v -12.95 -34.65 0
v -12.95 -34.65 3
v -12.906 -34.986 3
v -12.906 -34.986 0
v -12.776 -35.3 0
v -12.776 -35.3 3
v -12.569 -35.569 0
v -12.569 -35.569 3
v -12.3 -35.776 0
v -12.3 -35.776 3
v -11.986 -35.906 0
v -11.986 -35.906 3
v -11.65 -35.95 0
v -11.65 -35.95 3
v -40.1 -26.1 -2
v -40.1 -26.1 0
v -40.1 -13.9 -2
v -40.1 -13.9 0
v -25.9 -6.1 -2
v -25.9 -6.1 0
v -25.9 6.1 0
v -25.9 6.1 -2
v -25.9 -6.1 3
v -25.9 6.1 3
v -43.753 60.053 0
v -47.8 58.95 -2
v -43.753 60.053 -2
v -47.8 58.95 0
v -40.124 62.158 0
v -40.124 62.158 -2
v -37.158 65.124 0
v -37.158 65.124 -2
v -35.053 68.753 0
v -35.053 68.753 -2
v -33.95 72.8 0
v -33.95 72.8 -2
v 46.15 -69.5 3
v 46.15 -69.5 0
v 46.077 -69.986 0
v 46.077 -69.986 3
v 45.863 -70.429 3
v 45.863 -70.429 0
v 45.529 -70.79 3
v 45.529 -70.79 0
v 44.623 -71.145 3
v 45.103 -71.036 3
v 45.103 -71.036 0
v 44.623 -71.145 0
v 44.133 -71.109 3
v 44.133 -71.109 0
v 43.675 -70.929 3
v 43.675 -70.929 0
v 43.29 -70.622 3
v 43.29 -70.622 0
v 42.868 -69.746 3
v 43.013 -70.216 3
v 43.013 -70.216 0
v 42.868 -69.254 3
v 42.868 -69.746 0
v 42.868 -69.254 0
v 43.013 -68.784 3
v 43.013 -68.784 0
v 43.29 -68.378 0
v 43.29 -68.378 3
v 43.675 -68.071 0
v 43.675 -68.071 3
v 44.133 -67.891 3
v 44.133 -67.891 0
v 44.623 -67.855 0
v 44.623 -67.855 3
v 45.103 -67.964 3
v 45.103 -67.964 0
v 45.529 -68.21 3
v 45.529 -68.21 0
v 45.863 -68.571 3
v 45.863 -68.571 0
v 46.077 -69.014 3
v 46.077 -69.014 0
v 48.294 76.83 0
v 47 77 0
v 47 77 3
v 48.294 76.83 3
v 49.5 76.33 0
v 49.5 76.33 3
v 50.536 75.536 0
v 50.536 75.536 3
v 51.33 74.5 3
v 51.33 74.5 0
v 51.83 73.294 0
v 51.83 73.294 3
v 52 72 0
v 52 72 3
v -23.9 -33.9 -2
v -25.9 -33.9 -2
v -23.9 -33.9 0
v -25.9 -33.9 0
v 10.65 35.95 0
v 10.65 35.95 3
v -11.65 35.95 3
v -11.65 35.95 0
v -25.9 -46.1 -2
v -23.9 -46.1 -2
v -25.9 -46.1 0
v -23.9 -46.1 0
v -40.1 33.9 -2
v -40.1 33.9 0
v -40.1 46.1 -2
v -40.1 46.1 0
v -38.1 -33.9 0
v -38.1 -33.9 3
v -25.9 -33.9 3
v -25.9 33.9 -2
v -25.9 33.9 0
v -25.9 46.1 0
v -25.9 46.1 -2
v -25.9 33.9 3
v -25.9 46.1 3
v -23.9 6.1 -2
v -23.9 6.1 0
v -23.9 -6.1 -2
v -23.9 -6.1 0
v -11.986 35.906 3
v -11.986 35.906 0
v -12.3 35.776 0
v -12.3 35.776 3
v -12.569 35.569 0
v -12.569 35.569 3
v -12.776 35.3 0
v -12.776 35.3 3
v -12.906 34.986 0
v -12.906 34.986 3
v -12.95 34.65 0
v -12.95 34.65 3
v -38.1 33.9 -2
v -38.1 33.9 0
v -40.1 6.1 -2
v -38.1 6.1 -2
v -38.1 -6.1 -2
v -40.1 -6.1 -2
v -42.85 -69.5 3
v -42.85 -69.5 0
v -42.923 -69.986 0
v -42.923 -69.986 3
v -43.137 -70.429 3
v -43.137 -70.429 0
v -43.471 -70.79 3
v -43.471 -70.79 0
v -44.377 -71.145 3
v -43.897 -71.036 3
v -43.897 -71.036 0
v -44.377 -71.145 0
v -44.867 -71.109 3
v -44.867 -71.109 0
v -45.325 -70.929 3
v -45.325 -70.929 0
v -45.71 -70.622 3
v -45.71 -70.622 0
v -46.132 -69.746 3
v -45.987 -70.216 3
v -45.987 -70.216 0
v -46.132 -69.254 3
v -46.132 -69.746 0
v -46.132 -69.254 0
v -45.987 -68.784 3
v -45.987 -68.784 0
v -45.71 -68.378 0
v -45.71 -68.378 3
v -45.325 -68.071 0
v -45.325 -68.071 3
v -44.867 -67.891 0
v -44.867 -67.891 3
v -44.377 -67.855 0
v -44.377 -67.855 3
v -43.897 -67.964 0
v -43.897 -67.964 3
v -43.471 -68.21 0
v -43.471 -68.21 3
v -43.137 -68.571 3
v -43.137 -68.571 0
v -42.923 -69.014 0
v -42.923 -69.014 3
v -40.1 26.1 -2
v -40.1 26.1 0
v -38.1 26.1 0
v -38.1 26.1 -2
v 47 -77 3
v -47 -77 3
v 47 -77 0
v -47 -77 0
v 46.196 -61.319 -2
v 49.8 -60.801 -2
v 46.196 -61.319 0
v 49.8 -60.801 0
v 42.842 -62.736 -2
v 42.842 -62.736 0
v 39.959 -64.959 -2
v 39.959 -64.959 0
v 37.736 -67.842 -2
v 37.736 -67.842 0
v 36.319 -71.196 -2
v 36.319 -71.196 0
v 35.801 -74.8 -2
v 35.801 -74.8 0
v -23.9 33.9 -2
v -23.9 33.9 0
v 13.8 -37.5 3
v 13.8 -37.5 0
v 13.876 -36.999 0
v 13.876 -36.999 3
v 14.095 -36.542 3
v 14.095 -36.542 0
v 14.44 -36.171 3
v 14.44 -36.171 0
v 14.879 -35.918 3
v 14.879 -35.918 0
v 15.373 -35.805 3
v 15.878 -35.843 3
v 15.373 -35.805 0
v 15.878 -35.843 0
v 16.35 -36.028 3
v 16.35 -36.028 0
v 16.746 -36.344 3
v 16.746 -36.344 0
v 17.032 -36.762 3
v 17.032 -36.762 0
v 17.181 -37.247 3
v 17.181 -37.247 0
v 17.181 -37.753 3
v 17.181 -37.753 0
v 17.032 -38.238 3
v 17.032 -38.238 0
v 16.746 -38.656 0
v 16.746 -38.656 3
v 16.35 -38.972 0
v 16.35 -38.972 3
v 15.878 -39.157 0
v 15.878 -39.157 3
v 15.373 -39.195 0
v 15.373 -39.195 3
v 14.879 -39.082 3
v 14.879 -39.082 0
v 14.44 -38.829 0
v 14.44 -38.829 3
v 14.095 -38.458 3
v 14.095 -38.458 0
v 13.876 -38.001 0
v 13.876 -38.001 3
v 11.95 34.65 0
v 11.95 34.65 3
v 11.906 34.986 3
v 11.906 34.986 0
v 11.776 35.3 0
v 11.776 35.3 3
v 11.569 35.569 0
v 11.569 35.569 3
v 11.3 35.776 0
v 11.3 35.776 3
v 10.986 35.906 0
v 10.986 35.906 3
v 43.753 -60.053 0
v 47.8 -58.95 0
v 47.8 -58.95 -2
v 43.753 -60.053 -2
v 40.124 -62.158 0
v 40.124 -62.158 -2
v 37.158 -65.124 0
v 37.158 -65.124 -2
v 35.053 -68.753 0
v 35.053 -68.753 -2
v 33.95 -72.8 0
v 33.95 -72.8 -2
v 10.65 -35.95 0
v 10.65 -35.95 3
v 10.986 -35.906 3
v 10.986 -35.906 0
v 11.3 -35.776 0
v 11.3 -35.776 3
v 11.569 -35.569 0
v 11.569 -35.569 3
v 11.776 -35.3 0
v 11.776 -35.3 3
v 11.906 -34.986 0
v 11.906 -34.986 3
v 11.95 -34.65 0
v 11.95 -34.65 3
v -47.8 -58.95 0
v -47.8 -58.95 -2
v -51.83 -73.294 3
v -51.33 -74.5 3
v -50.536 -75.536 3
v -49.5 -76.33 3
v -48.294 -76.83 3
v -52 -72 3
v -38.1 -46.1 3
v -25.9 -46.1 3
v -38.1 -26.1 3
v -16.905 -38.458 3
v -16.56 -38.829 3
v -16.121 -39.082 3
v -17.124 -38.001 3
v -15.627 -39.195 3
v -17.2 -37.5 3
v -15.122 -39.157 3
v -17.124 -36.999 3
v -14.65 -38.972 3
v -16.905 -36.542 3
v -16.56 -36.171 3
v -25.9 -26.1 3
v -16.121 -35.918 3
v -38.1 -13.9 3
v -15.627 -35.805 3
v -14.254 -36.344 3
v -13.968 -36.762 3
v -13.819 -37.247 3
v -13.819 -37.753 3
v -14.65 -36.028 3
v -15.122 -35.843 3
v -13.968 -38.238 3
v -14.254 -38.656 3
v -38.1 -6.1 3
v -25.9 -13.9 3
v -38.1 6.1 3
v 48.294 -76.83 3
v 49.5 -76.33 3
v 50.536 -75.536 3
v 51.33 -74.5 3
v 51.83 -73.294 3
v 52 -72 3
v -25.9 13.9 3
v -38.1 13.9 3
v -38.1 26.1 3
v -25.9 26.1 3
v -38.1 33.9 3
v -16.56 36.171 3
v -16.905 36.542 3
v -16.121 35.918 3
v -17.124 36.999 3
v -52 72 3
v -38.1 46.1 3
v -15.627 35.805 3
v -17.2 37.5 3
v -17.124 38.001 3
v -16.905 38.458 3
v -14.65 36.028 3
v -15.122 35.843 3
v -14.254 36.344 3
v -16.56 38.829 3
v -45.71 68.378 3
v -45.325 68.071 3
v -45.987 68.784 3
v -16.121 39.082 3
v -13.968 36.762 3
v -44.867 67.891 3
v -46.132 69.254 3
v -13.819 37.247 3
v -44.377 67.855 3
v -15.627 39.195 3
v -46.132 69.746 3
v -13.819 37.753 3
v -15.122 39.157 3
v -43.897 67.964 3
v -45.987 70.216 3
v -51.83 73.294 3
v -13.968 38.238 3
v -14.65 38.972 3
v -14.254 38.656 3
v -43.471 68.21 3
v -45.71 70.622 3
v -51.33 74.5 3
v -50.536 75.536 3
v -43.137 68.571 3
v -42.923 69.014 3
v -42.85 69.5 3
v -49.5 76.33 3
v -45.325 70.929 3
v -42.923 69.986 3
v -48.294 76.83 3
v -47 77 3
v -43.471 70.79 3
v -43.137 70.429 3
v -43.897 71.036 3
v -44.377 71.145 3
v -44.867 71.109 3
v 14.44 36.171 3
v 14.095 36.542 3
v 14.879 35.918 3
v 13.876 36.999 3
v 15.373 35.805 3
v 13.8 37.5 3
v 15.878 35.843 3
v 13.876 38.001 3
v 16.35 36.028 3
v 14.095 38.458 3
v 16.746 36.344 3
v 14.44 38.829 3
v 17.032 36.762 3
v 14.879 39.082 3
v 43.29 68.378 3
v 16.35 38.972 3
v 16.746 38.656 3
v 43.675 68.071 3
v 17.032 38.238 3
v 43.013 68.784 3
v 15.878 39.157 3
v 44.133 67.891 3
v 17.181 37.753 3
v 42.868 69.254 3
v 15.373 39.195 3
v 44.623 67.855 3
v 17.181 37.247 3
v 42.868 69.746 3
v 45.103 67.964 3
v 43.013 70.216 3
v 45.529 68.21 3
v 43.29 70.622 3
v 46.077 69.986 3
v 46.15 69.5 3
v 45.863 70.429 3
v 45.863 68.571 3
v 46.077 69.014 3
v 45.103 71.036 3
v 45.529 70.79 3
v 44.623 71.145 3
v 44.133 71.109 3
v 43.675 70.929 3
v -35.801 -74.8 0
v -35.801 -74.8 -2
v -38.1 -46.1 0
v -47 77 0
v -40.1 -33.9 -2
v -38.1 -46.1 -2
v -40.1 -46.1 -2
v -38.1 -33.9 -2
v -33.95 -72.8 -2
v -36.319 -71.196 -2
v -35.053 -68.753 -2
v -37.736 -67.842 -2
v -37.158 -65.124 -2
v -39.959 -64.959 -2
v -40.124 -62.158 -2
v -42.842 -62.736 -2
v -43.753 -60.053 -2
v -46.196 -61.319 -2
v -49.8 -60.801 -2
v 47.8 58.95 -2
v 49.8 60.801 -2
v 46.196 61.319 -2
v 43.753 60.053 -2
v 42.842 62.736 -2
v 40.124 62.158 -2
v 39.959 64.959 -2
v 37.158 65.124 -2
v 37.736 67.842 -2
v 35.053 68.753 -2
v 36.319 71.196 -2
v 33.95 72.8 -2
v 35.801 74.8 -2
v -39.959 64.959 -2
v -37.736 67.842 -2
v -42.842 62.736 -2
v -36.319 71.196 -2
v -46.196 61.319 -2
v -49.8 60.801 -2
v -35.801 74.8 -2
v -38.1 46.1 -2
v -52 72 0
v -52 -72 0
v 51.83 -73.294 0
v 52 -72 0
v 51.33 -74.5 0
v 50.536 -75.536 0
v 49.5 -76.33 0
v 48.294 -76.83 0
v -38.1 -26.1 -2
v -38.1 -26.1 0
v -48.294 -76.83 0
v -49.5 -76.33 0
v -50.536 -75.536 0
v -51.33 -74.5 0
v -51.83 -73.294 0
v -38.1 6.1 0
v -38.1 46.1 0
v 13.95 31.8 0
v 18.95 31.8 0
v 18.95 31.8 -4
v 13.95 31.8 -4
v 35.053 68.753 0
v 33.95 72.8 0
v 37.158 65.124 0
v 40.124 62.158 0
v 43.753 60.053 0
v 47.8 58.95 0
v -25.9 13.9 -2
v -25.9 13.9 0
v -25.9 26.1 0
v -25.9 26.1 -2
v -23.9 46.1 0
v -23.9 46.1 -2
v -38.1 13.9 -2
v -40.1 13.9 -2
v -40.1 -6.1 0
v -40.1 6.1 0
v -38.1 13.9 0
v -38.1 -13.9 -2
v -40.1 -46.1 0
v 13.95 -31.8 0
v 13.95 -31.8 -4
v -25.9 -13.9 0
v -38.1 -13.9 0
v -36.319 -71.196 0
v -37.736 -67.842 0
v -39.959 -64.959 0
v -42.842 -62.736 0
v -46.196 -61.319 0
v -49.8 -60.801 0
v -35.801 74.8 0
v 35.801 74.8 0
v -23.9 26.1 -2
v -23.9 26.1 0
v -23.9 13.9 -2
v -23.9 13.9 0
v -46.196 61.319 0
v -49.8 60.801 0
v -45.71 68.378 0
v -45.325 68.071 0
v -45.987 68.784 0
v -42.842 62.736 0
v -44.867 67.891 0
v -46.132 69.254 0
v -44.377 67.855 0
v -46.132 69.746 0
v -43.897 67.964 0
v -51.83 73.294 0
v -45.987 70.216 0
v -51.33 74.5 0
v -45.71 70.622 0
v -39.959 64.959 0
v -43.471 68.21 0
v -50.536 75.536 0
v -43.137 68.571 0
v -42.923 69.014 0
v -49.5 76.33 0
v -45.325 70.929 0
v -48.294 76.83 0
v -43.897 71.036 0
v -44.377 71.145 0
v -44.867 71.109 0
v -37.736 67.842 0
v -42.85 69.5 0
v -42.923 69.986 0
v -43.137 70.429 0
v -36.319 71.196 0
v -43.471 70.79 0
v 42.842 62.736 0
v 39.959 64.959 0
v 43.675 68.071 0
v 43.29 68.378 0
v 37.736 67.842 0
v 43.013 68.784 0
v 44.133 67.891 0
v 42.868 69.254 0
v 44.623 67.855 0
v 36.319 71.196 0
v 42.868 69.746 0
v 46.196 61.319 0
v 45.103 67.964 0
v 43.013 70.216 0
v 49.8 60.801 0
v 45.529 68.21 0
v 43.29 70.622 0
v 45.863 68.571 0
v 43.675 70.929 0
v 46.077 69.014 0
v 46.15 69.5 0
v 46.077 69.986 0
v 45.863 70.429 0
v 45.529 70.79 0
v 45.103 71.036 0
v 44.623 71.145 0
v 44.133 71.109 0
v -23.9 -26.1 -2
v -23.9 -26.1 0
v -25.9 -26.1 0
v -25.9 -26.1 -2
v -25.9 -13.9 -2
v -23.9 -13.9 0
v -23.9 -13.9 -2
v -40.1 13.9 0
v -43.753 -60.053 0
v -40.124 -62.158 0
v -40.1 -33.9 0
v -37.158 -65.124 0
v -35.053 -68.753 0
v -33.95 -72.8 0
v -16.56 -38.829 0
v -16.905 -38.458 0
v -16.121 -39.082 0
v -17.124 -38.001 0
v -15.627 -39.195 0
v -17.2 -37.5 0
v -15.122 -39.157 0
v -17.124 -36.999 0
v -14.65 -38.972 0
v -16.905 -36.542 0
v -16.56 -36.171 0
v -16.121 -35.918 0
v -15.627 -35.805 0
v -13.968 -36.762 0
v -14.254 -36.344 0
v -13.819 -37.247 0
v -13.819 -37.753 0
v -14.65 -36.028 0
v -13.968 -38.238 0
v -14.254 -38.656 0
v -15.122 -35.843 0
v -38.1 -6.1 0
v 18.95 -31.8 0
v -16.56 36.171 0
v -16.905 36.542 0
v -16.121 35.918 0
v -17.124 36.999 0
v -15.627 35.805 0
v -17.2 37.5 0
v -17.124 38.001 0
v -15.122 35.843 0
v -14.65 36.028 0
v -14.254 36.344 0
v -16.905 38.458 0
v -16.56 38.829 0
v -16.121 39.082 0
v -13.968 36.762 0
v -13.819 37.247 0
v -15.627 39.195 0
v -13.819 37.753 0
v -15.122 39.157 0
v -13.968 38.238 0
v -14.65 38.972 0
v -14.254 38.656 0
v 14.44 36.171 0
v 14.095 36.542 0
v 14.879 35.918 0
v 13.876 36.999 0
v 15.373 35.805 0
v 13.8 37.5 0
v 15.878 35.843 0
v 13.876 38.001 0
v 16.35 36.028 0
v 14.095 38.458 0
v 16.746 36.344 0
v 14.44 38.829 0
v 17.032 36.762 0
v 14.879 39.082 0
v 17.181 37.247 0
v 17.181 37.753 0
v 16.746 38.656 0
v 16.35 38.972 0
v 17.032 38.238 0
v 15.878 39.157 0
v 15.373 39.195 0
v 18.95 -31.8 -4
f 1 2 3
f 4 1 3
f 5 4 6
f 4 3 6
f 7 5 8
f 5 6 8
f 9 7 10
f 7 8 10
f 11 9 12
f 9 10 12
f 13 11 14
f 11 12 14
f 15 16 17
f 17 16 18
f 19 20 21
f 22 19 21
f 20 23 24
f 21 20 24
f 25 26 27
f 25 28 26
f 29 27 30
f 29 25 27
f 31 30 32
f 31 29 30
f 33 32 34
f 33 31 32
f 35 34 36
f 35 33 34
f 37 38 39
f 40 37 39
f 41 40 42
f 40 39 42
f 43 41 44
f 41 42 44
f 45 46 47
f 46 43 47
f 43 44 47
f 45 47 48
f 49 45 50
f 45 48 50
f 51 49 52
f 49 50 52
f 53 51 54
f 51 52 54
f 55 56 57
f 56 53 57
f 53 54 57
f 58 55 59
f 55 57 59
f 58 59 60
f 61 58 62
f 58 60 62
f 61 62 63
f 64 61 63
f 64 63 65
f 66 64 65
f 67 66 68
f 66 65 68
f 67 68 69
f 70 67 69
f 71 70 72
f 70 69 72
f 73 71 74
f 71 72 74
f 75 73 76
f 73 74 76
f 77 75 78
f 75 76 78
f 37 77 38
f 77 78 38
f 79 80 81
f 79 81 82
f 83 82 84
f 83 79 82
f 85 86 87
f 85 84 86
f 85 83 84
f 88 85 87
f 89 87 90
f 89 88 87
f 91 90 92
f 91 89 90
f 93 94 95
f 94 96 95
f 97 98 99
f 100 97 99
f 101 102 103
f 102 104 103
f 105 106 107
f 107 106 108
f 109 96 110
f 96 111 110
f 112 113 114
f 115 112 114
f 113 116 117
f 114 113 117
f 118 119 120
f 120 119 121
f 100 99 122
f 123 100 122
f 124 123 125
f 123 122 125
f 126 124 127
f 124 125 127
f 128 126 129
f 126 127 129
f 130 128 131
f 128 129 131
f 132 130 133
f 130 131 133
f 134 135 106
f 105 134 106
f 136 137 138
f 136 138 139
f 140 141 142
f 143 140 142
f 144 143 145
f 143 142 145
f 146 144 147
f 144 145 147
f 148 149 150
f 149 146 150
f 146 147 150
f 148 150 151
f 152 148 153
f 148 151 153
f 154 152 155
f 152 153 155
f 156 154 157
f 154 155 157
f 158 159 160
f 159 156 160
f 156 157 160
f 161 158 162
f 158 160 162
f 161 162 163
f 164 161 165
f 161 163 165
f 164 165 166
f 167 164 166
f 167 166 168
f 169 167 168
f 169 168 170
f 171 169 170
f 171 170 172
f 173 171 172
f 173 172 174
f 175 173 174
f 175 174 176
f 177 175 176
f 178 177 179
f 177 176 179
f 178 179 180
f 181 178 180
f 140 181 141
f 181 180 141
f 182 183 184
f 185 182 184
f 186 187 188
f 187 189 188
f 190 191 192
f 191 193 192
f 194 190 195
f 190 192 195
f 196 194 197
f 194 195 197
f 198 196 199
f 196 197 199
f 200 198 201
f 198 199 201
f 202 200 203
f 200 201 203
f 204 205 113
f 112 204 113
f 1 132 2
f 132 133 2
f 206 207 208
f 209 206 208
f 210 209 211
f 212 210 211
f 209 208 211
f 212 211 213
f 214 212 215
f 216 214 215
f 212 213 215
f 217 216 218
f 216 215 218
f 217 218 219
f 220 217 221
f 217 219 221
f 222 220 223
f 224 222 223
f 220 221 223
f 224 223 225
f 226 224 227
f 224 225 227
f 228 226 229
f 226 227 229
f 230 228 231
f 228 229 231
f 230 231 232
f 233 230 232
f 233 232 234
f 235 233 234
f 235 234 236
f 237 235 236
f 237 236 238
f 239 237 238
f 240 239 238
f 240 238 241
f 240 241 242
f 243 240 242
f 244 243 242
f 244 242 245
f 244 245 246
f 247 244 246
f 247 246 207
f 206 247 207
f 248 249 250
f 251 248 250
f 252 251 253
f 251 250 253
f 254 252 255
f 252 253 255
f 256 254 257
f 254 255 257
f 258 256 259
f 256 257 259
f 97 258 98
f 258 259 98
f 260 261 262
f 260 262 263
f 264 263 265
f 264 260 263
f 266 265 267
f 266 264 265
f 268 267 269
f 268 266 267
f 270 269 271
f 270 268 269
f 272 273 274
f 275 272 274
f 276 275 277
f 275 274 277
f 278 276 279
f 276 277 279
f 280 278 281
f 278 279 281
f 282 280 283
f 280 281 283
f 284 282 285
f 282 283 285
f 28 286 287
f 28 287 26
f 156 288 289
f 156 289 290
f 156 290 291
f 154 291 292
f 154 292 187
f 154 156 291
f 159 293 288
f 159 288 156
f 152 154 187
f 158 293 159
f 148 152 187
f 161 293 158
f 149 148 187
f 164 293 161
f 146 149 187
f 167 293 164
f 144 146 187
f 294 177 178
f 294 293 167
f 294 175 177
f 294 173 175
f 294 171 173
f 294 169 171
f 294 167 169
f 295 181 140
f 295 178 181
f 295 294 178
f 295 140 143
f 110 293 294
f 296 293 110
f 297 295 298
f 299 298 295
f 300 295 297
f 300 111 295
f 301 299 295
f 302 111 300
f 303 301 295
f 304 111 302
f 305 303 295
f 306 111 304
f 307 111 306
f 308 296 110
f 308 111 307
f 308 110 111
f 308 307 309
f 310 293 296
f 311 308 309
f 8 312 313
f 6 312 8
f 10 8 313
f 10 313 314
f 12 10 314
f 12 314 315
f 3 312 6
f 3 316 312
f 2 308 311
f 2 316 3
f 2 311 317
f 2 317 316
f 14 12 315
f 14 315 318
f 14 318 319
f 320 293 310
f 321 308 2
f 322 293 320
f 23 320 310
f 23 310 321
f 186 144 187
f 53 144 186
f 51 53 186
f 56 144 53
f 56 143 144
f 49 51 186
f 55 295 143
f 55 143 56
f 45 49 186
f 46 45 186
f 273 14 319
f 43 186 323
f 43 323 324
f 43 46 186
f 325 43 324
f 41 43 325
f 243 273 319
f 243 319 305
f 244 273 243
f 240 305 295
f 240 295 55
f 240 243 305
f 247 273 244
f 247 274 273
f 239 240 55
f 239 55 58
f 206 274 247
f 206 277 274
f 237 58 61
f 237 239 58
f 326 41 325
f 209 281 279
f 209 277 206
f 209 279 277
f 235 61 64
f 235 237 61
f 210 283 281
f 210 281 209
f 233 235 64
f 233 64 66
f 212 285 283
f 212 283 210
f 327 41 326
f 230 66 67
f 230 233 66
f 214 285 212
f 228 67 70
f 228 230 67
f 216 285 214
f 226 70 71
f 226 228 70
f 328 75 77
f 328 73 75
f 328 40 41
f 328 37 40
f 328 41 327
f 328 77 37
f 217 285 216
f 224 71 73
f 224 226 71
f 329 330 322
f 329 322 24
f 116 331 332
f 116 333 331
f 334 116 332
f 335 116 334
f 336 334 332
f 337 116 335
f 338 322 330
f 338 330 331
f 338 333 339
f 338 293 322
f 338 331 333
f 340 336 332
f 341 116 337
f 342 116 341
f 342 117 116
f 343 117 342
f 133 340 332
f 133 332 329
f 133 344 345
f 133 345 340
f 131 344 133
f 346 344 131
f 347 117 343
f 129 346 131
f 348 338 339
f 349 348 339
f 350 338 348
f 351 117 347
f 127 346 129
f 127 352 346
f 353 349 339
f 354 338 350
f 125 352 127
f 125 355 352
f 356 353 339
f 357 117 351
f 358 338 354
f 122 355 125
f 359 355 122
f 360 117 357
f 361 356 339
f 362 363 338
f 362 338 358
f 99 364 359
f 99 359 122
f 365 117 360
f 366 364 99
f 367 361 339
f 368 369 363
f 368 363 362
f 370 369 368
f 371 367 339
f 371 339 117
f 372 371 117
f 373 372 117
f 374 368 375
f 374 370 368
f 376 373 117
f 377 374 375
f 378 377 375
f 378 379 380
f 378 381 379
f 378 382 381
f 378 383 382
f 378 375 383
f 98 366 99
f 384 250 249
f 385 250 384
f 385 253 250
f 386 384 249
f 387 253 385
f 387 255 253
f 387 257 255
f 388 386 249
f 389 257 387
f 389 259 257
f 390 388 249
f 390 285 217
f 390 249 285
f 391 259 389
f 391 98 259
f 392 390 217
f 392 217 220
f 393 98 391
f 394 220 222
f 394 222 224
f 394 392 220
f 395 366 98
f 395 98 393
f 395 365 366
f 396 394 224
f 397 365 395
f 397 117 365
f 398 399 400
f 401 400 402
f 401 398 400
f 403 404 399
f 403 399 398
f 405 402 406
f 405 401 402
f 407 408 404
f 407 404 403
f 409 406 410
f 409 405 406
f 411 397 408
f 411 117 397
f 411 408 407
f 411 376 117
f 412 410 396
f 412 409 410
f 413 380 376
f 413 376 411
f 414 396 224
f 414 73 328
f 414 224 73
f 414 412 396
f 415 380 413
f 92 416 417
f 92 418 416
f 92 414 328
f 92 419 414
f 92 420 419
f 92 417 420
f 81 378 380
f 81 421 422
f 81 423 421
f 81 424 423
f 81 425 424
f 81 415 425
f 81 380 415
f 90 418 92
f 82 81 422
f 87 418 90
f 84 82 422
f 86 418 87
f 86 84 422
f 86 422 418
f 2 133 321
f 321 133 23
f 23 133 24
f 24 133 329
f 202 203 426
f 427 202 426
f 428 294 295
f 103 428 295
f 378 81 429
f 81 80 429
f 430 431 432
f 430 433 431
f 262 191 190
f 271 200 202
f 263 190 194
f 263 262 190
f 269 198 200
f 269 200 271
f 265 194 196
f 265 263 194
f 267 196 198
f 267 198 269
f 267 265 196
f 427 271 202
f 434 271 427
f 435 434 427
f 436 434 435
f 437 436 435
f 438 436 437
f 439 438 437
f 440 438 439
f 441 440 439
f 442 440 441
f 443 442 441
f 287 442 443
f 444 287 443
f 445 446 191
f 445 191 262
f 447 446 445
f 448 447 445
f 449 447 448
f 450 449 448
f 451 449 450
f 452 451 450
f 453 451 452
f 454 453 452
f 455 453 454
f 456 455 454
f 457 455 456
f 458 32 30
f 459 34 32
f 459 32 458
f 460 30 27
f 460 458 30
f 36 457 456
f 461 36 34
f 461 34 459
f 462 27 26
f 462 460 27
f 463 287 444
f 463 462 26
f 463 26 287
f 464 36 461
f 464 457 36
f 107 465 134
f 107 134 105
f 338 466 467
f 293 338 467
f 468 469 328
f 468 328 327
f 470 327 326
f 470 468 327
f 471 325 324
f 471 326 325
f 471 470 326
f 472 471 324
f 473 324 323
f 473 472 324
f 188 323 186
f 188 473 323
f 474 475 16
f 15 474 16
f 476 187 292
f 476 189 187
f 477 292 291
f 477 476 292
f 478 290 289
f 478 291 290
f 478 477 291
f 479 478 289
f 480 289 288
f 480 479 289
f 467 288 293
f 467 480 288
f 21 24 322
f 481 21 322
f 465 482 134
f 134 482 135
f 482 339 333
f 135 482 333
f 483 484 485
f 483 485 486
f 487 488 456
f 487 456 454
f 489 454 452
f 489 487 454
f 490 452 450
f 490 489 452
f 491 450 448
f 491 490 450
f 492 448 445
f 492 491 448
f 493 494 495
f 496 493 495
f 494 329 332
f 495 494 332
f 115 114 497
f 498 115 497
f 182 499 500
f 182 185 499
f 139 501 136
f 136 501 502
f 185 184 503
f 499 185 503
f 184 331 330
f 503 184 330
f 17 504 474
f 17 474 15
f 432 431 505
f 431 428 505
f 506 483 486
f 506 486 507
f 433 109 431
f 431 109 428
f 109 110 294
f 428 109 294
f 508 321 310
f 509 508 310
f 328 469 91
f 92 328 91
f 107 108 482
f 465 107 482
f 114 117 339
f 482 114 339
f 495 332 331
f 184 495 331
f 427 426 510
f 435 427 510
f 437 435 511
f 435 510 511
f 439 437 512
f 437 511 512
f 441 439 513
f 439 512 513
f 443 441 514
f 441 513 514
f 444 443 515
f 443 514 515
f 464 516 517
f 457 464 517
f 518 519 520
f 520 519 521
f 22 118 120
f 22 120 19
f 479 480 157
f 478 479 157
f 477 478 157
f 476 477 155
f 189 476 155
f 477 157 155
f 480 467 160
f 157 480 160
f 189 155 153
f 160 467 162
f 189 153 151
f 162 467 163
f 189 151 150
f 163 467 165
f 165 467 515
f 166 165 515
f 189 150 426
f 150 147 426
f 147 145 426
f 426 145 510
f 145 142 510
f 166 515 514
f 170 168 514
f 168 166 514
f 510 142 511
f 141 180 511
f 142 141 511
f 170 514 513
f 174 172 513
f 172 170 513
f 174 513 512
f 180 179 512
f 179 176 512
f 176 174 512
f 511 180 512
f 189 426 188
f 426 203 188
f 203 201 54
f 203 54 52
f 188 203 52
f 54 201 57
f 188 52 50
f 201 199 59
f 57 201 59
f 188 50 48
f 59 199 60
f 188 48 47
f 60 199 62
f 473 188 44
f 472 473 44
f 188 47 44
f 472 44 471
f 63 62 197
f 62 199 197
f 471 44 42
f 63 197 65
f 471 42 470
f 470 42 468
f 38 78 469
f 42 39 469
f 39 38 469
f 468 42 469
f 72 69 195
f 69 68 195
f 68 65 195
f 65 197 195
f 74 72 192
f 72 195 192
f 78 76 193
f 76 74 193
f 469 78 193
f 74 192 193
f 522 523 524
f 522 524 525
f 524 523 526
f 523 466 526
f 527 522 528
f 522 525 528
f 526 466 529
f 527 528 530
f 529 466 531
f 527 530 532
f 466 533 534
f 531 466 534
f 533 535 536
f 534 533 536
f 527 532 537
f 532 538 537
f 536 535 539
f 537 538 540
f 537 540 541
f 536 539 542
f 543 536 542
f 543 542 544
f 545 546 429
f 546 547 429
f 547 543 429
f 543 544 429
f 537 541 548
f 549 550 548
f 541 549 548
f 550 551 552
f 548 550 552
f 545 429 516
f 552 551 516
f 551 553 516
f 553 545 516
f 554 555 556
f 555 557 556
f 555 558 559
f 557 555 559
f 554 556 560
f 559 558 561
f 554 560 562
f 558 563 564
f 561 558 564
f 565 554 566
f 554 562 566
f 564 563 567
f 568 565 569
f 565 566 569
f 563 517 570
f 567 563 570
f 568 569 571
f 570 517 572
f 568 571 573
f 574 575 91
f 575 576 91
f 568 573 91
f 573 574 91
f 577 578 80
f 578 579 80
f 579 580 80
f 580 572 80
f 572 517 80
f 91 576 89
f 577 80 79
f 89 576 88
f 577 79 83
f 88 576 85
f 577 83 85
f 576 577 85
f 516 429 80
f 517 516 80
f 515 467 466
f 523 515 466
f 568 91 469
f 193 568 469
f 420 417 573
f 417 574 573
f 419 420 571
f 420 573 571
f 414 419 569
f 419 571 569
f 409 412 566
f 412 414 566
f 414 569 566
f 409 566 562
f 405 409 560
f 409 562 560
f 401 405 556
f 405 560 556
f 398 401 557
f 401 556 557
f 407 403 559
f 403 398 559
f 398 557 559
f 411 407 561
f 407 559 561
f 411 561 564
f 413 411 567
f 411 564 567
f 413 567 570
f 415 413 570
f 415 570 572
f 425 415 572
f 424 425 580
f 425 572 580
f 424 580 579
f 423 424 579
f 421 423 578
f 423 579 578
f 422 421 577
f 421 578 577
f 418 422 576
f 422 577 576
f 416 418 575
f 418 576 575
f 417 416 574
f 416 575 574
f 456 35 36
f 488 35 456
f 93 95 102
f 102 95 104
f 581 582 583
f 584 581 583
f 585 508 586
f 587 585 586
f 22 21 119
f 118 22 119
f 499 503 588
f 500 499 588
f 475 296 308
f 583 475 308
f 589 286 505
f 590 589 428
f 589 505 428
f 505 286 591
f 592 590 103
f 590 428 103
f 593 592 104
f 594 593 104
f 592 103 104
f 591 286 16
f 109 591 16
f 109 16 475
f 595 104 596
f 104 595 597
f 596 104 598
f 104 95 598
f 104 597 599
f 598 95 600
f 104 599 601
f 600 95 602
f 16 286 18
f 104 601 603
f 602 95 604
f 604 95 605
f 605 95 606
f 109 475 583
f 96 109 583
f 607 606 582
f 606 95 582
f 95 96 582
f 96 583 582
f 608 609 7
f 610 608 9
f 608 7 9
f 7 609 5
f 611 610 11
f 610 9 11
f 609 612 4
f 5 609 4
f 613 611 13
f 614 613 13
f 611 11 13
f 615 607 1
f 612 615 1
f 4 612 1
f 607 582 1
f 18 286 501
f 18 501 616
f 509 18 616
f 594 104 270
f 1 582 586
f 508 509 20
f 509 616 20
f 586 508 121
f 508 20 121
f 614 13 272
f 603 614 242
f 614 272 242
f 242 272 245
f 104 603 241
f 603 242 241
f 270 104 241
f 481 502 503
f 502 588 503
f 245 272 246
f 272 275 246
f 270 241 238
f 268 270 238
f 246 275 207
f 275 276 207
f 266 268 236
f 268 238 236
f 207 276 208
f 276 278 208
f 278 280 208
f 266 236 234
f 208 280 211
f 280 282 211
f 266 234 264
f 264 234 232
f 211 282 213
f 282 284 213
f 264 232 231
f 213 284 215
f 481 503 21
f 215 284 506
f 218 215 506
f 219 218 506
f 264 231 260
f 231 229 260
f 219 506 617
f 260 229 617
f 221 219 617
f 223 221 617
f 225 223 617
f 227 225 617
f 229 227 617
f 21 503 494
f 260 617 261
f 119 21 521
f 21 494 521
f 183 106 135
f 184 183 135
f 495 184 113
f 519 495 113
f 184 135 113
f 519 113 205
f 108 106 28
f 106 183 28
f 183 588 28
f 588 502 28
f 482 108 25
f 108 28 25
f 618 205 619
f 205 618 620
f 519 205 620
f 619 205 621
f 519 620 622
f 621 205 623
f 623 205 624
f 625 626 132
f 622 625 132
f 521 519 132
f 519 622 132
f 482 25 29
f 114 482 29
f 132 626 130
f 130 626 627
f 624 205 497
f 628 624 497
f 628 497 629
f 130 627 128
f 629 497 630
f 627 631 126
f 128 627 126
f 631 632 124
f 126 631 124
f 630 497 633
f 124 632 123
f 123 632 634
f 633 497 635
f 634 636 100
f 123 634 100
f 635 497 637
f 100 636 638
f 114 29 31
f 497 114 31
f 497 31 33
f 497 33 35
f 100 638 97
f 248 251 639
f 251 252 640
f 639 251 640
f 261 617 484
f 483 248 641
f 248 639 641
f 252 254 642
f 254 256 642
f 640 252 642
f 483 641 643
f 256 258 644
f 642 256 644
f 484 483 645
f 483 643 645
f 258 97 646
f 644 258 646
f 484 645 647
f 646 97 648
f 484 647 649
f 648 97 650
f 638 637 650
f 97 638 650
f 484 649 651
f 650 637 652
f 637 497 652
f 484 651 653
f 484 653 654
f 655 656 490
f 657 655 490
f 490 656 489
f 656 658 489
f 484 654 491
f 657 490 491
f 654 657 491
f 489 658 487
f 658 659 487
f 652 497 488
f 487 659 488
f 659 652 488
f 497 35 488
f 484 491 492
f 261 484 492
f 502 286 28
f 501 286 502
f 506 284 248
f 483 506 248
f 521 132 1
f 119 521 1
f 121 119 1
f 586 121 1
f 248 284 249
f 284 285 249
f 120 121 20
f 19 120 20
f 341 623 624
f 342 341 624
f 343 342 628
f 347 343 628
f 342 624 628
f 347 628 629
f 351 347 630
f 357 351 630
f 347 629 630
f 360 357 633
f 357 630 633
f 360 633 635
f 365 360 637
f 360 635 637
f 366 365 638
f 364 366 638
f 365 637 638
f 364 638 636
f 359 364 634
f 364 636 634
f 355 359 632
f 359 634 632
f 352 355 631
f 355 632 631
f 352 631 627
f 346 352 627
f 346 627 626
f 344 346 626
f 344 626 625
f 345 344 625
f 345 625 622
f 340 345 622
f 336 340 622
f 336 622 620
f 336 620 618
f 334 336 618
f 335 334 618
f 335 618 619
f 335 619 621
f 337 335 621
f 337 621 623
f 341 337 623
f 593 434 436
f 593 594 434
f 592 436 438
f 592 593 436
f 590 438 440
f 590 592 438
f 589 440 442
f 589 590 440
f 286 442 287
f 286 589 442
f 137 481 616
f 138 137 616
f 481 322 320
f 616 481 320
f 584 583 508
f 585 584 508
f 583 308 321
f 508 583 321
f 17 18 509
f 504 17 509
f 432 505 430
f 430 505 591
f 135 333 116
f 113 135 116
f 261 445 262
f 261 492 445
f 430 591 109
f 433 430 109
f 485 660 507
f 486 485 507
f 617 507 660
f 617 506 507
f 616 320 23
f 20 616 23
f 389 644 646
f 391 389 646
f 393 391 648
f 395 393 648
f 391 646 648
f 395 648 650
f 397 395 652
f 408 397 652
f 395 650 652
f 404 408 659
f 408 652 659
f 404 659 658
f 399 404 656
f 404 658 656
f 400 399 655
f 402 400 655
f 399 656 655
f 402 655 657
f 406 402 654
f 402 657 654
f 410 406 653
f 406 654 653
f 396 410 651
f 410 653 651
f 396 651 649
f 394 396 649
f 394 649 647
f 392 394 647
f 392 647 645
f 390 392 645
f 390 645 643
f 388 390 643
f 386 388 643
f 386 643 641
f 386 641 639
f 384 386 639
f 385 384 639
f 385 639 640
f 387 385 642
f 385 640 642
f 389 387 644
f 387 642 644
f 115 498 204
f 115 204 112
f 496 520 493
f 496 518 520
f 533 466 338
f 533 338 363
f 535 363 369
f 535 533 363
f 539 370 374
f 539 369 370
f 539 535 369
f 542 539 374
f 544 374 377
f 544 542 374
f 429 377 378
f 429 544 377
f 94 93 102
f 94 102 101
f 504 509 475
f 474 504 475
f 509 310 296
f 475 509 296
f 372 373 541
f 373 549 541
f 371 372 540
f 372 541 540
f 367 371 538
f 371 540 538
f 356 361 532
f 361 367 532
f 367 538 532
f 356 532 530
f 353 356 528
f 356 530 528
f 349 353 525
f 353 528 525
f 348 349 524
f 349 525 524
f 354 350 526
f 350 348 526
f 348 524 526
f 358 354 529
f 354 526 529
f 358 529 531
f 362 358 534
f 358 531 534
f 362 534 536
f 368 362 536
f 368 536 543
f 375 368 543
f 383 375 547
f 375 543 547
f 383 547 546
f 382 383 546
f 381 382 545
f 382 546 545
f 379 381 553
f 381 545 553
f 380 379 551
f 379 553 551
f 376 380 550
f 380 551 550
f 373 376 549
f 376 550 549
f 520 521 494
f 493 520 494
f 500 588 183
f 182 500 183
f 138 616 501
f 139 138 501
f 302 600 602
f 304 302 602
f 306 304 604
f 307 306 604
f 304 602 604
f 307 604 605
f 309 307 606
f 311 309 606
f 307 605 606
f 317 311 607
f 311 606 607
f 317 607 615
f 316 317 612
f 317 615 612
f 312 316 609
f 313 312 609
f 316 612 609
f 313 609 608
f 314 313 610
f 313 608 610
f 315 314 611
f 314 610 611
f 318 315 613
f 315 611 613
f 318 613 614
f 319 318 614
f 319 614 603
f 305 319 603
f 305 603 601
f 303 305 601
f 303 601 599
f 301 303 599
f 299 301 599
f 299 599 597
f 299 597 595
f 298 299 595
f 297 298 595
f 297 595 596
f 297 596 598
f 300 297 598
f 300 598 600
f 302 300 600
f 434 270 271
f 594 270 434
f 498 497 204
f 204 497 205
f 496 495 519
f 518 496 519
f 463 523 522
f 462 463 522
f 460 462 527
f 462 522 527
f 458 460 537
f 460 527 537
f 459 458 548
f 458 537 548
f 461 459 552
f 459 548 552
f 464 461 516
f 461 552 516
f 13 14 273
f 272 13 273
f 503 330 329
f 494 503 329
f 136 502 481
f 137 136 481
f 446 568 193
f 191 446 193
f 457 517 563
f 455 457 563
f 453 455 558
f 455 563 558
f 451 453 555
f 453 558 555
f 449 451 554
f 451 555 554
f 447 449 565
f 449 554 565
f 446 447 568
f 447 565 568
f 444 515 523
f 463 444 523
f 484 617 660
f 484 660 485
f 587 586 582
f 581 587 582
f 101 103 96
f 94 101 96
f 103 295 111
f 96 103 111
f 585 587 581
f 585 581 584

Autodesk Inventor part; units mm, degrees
ref_plane "YZ Plane" through (0, 0, 0) normal (1, 0, 0) x (0, 1, 0)
ref_plane "XZ Plane" through (0, 0, 0) normal (0, 1, 0) x (-1, 0, 0)
ref_plane "XY Plane" through (0, 0, 0) normal (0, 0, 1) x (1, 0, 0)
sketch "Sketch2" plane through (0, 0, 0) normal (0, 0, 1) x (1, 0, 0)
  arc A0 (-52, -72) -> (-47, -77) centre (-47, -72) ccw projected
  line L0 (-52, 72) -> (-52, -72) projected
  arc A1 (-47, 77) -> (-52, 72) centre (-47, 72) ccw projected
  line L1 (47, 77) -> (-47, 77) projected
  arc A2 (52, 72) -> (47, 77) centre (47, 72) ccw projected
  line L2 (52, -72) -> (52, 72) projected
  arc A3 (47, -77) -> (52, -72) centre (47, -72) ccw projected
  line L3 (-47, -77) -> (47, -77) projected
  circle A4 centre (44.5, -69.5) radius 1.65 projected
  circle A5 centre (-44.5, -69.5) radius 1.65 projected
  circle A6 centre (-44.5, 69.5) radius 1.65 projected
  circle A7 centre (44.5, 69.5) radius 1.65 projected
  point P0 (0, 0)
extrude "Extrusion2" add sketch "Sketch2" along normal blind 3
sketch "Sketch3" plane through (0, 0, 0) normal (0, 0, -1) x (-1, 0, 0)
  arc A0 (-50, 61) -> (-36, 75) centre (-50, 75) ccw projected
  line L0 (36, 75) -> (-36, 75) projected
  arc A1 (36, 75) -> (50, 61) centre (50, 75) ccw projected
  line L1 (50, -61) -> (50, 61) projected
  line L2 (-50, 61) -> (-50, -61) projected
  arc A2 (-36, -75) -> (-50, -61) centre (-50, -75) ccw projected
  line L3 (-36, -75) -> (36, -75) projected
  arc A3 (50, -61) -> (36, -75) centre (50, -75) ccw projected
  arc A4 (-49.8, 60.8014) -> (-35.8014, 74.8) centre (-50, 75) ccw
  line L4 (-49.8, 60.8014) -> (-49.8, -60.8014)
  arc A5 (-35.8014, -74.8) -> (-49.8, -60.8014) centre (-50, -75) ccw
  line L5 (-35.8014, -74.8) -> (35.8014, -74.8)
  arc A6 (49.8, -60.8014) -> (35.8014, -74.8) centre (50, -75) ccw
  line L6 (49.8, -60.8014) -> (49.8, 60.8014)
  arc A7 (35.8014, 74.8) -> (49.8, 60.8014) centre (50, 75) ccw
  line L7 (35.8014, 74.8) -> (-35.8014, 74.8)
  arc A8 (-47.8, 58.9501) -> (-33.9501, 72.8) centre (-50, 75) ccw
  line L8 (-47.8, 58.9501) -> (-47.8, -58.9501)
  arc A9 (-33.9501, -72.8) -> (-47.8, -58.9501) centre (-50, -75) ccw
  line L9 (-33.9501, -72.8) -> (33.9501, -72.8)
  arc A10 (47.8, -58.9501) -> (33.9501, -72.8) centre (50, -75) ccw
  line L10 (47.8, -58.9501) -> (47.8, 58.9501)
  arc A11 (33.9501, 72.8) -> (47.8, 58.9501) centre (50, 75) ccw
  line L11 (33.9501, 72.8) -> (-33.9501, 72.8)
  point P0 (0, 0)
  dimension "d4" = 0.2
  dimension "d5" = 2
extrude "Extrusion3" add sketch "Sketch3" along normal blind 2 contours A4 L7 A7 L6 A6 L5 A5 L4
sketch "Sketch4" plane through (0, 0, 3) normal (0, 0, 1) x (1, 0, 0)
  line L0 (11.65, 34.65) -> (11.65, -34.65) projected
  arc A0 (11.65, 34.65) -> (10.65, 35.65) centre (10.65, 34.65) ccw projected
  line L1 (-11.65, 35.65) -> (10.65, 35.65) projected
  arc A1 (-11.65, 35.65) -> (-12.65, 34.65) centre (-11.65, 34.65) ccw projected
  line L2 (-12.65, -34.65) -> (-12.65, 34.65) projected
  arc A2 (-12.65, -34.65) -> (-11.65, -35.65) centre (-11.65, -34.65) ccw projected
  line L3 (10.65, -35.65) -> (-11.65, -35.65) projected
  arc A3 (10.65, -35.65) -> (11.65, -34.65) centre (10.65, -34.65) ccw projected
  line L4 (11.95, -34.65) -> (11.95, 34.65)
  arc A4 (11.95, 34.65) -> (10.65, 35.95) centre (10.65, 34.65) ccw
  line L5 (10.65, 35.95) -> (-11.65, 35.95)
  arc A5 (-11.65, 35.95) -> (-12.95, 34.65) centre (-11.65, 34.65) ccw
  line L6 (-12.95, 34.65) -> (-12.95, -34.65)
  arc A6 (-12.95, -34.65) -> (-11.65, -35.95) centre (-11.65, -34.65) ccw
  line L7 (-11.65, -35.95) -> (10.65, -35.95)
  arc A7 (10.65, -35.95) -> (11.95, -34.65) centre (10.65, -34.65) ccw
  point P0 (0, 0)
  dimension "d10" = 0.3
extrude "Extrusion4" cut sketch "Sketch4" against normal up to surface (3 mm away) contours L0 A3 L3 A2 L2 A1 L1 A0 | A7 L7 A6 L6 A5 L5 A4 L4
sketch "Sketch5" plane through (0, 0, 0) normal (0, 0, -1) x (-1, 0, 0)
  circle A0 centre (15.5, 37.5) radius 1.5 projected
  circle A1 centre (-15.5, 37.5) radius 1.5 projected
  circle A2 centre (15.5, -37.5) radius 1.5 projected
  circle A3 centre (-15.5, -37.5) radius 1.5 projected
  circle A4 centre (15.5, -37.5) radius 1.7
  circle A5 centre (15.5, 37.5) radius 1.7
  circle A6 centre (-15.5, 37.5) radius 1.7
  circle A7 centre (-15.5, -37.5) radius 1.7
  point P0 (0, 0)
  dimension "d11" = 0.2
  dimension "d12" = 0.2
  dimension "d13" = 0.2
  dimension "d14" = 0.2
extrude "Extrusion5" cut sketch "Sketch5" against normal up to surface (3 mm away) contours A0 | A1 | A2 | A3 | A4 | A5 | A6 | A7
sketch "Sketch6" plane through (0, 0, 3) normal (0, 0, 1) x (1, 0, 0)
  line L0 (-25.9, 6.1) -> (-38.1, 6.1)
  line L1 (-38.1, 6.1) -> (-38.1, -6.1)
  line L2 (-38.1, -6.1) -> (-25.9, -6.1)
  line L3 (-25.9, -6.1) -> (-25.9, 6.1)
  line L4 (-25.9, 6.1) -> (-38.1, -6.1) construction
  line L5 (-38.1, 6.1) -> (-25.9, -6.1) construction
  line L6 (-52, 72) -> (-52, -72) projected
  line L7 (47, 77) -> (-47, 77) projected
  line L8 (52, -72) -> (52, 72) projected
  line L9 (52, 0) -> (-52, 0)
  point P0 (0, 0)
  point P1 (-32, 0)
  dimension "d17" = 12.2
  dimension "d18" = 12.2
  dimension "d19" = 20
extrude "Extrusion6" cut sketch "Sketch6" against normal up to surface (3 mm away)
pattern_linear "Rectangular Pattern1" count 3 spacing 20 along (0, -1, 0) count 3 spacing 20 along (0, 1, 0) of "Extrusion6"
sketch "Sketch9" plane through (0, 0, 0) normal (0, 0, -1) x (-1, 0, 0)
  line L0 (-13.95, -31.8) -> (-18.95, -31.8)
  line L1 (-18.95, -31.8) -> (-18.95, 31.8)
  line L2 (-18.95, 31.8) -> (-13.95, 31.8)
  line L3 (-13.95, 31.8) -> (-13.95, -31.8)
  circle A0 centre (-15.5, -37.5) radius 1.7 projected
  circle A1 centre (-15.5, 37.5) radius 1.7 projected
  line L4 (-11.95, -34.65) -> (-11.95, 34.65) projected
  point P0 (0, 0)
  dimension "d38" = 4
  dimension "d40" = 4
  dimension "d41" = 2
  dimension "d42" = 5
extrude "Extrusion9" add sketch "Sketch9" along normal blind 4 contours L0 L1 L2 L3
sketch "Sketch10" plane through (0, 0, 0) normal (0, 0, -1) x (-1, 0, 0)
  point P0 (0, 0)
sketch "Sketch11" plane through (0, 0, 0) normal (0, 0, -1) x (-1, 0, 0)
  line L0 (25.9, 33.9) -> (38.1, 33.9) projected
  line L1 (38.1, 33.9) -> (40.1, 33.9)
  line L2 (40.1, 33.9) -> (40.1, 46.1)
  line L3 (40.1, 46.1) -> (38.1, 46.1)
  line L4 (38.1, 46.1) -> (38.1, 33.9)
  line L5 (25.9, 46.1) -> (25.9, 33.9) projected
  line L6 (25.9, 46.1) -> (23.9, 46.1)
  line L7 (23.9, 46.1) -> (23.9, 33.9)
  line L8 (23.9, 33.9) -> (25.9, 33.9)
  line L9 (25.9, 33.9) -> (25.9, 46.1)
  point P0 (0, 0)
  dimension "d45" = 2
  dimension "d46" = 2
extrude "Extrusion10" add sketch "Sketch11" along normal up to surface (2 mm away)
pattern_linear "Rectangular Pattern3" count 5 spacing 20 along (0, -1, 0) of "Extrusion10"
equation "\"d46\" = d45"
properties part number "lid"
